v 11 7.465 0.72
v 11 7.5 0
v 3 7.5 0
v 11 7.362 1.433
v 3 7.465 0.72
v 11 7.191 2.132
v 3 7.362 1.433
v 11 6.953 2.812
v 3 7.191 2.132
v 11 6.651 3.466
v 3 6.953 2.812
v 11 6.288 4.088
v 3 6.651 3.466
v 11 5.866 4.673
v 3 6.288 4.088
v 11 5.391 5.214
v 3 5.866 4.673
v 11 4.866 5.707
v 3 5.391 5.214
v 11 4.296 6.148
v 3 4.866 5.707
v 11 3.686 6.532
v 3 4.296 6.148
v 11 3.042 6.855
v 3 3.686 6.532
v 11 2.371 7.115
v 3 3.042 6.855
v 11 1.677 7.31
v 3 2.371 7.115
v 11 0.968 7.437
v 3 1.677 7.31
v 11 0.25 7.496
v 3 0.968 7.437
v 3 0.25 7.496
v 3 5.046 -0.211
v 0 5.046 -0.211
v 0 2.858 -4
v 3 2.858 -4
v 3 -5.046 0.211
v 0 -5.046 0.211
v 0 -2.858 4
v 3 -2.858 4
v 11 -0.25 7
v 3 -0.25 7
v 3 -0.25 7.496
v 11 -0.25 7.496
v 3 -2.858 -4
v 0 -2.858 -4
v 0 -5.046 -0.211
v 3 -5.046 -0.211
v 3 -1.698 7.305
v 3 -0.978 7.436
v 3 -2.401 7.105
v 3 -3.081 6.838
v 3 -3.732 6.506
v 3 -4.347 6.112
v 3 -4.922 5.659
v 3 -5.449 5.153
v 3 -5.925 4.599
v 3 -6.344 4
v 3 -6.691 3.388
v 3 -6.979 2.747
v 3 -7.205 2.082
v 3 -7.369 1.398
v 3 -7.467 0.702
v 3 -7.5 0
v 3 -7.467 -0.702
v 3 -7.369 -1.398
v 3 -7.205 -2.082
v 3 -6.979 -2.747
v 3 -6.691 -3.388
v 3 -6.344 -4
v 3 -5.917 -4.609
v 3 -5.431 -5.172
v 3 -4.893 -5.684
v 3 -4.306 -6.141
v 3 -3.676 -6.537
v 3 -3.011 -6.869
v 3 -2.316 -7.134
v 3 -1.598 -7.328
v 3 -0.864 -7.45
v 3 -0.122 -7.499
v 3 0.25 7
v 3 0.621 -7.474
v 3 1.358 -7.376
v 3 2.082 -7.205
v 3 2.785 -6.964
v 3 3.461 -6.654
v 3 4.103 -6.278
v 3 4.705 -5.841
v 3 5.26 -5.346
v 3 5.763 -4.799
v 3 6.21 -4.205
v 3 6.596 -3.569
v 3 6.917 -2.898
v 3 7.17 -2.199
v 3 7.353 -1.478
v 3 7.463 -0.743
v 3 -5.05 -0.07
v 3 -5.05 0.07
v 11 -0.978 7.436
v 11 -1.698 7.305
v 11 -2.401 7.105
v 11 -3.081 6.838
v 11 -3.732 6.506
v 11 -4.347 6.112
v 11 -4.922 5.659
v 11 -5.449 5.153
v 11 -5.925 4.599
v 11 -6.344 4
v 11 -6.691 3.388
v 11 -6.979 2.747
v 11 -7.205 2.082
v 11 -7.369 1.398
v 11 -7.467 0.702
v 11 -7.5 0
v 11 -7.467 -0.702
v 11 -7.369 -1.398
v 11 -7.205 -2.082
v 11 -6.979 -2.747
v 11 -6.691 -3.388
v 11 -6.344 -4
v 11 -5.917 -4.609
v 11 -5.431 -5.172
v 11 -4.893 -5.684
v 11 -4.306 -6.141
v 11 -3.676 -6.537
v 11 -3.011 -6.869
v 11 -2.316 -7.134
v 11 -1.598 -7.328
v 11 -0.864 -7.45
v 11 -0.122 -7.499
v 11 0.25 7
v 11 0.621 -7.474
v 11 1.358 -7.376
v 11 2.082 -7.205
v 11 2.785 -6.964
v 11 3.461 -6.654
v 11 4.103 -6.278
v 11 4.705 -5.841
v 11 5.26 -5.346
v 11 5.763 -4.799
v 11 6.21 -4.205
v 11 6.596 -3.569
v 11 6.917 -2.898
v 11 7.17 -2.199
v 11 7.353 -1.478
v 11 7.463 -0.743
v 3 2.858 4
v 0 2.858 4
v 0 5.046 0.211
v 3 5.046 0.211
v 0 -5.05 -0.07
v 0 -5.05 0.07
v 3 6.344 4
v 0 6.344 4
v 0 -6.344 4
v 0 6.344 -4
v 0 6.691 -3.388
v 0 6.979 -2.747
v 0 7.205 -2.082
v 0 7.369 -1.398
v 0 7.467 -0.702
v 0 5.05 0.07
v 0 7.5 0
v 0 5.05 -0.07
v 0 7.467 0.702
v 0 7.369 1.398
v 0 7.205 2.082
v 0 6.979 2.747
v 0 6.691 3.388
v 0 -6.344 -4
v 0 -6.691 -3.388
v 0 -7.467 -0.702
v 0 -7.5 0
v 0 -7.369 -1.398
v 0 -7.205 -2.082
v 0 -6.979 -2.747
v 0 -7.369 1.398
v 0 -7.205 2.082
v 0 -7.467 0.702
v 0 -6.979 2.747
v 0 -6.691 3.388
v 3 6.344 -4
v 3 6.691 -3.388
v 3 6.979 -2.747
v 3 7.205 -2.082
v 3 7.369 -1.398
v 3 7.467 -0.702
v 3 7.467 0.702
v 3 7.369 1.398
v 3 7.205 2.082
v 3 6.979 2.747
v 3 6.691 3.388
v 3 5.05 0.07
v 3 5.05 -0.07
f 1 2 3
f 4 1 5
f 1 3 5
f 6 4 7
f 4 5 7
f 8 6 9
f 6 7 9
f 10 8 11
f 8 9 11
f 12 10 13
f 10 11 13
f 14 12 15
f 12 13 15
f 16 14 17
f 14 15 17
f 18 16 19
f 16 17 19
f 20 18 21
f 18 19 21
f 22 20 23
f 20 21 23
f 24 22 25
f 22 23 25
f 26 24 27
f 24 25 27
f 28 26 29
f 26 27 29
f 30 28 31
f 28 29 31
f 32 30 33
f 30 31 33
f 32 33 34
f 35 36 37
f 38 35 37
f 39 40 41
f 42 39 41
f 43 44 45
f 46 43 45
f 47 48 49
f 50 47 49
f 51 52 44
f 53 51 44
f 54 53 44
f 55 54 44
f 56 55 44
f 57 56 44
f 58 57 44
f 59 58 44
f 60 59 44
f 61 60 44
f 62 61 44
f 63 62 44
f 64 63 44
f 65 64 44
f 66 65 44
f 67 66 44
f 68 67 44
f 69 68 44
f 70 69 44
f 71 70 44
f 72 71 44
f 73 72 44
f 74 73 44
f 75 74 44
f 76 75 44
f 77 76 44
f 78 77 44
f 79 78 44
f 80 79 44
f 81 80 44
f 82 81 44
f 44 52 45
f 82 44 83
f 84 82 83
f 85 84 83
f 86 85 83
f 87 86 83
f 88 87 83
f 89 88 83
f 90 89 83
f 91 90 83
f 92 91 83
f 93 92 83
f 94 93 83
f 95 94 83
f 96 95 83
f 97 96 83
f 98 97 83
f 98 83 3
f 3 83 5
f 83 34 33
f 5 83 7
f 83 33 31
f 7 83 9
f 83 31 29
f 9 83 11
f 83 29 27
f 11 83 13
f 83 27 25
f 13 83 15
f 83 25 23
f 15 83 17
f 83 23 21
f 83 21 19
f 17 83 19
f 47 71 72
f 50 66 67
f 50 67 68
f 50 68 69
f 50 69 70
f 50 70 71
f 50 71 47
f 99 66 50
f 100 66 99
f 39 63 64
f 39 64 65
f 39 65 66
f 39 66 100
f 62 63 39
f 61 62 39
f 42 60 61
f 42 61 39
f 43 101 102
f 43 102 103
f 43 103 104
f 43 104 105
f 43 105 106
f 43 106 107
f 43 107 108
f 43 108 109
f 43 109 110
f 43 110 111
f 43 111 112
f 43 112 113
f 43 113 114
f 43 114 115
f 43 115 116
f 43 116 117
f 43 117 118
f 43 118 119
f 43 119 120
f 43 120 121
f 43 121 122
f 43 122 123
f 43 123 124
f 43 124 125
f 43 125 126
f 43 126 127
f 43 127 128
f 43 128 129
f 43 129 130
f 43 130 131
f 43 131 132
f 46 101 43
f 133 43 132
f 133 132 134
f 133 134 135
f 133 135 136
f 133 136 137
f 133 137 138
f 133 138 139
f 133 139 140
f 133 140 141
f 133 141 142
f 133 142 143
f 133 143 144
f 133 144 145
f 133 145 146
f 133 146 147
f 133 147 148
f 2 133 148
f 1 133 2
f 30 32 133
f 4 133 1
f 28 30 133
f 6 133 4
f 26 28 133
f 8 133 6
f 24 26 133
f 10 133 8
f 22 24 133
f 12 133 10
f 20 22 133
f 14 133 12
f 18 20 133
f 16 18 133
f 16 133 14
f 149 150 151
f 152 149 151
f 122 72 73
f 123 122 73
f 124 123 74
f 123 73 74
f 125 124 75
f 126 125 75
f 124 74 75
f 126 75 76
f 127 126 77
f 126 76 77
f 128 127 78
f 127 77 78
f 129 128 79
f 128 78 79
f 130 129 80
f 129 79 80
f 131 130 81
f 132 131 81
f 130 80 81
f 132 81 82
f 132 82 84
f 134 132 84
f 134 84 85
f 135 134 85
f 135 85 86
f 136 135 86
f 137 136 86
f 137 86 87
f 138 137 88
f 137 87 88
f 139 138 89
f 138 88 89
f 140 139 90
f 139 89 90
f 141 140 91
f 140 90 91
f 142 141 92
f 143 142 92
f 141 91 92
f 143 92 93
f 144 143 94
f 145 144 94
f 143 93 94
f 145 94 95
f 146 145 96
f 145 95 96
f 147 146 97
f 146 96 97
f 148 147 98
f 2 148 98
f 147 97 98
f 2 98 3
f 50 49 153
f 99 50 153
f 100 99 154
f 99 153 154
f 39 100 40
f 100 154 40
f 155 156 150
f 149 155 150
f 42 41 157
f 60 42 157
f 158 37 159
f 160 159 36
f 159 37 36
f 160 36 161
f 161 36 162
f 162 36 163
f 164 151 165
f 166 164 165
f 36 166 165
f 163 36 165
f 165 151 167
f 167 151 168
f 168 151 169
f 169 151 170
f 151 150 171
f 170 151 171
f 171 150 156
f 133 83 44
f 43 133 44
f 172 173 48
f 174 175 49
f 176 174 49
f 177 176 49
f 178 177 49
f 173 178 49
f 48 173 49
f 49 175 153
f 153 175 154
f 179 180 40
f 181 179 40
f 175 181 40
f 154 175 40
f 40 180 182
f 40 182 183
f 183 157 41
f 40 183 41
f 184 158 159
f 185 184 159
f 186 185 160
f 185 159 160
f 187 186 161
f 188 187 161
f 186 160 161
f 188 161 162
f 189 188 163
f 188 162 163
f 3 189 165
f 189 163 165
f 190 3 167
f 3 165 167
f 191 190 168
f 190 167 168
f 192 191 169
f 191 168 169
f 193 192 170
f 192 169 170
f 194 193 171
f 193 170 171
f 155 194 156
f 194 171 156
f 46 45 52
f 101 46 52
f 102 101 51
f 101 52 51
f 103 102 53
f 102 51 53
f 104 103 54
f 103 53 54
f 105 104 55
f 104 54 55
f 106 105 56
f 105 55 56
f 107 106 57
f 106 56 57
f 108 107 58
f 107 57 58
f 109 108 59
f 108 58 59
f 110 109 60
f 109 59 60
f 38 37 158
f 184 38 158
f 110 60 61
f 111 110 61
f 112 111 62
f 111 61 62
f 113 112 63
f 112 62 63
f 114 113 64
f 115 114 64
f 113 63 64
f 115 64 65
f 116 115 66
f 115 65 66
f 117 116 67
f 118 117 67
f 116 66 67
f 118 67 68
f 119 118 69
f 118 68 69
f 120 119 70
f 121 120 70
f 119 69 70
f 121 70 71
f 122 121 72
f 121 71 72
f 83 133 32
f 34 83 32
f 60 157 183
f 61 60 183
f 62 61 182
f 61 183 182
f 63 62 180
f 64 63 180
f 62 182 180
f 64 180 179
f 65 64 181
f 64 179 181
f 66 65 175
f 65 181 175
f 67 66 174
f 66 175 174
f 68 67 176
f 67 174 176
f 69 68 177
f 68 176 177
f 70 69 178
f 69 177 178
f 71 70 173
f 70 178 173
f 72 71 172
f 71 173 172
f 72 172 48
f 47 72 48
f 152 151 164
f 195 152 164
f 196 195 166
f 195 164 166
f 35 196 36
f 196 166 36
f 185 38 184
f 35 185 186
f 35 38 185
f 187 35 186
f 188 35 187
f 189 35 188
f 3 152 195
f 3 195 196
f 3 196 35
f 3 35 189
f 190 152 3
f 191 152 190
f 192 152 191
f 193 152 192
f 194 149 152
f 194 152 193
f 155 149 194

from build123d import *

# Parameters (mm, degrees)
F1_DEPTH = 3
F3_DEPTH = 8
F4_W     = 0.5
F4_H     = 0.5
F5_DEPTH = 25


with BuildPart() as f1:
    # F0 (on Right) → F1 (new body)
    with BuildSketch(Plane.YZ):
        with BuildLine():
            ThreePointArc((-5.0456, -0.210765), (-5.05, 0), (-5.0456, 0.210765))
            Line((-5.0456, 0.210765), (-2.857884, 4))
            Line((-2.857884, 4), (-6.344289, 4))
            ThreePointArc((-6.344289, 4), (-7.5, 0), (-6.344289, -4))
            Line((-6.344289, -4), (-2.857884, -4))
            Line((-2.857884, -4), (-5.0456, -0.210765))
        make_face()
        with BuildLine():
            Line((6.344289, 4), (2.857884, 4))
            Line((2.857884, 4), (5.0456, 0.210765))
            ThreePointArc((5.0456, 0.210765), (5.05, 0), (5.0456, -0.210765))
            Line((5.0456, -0.210765), (2.857884, -4))
            Line((2.857884, -4), (6.344289, -4))
            ThreePointArc((6.344289, -4), (7.5, 0), (6.344289, 4))
        make_face()
    extrude(amount=F1_DEPTH)


with BuildPart() as f3:
    # F2 (on face) → F3 (new body)
    with BuildSketch(Plane.YZ.offset(3)):
        with BuildLine():
            Line((-2.857884, 4), (-6.344289, 4))
            ThreePointArc((-6.344289, 4), (-7.5, 0), (-6.344289, -4))
            Line((-6.344289, -4), (-2.857884, -4))
            Line((-2.857884, -4), (-5.0456, -0.210765))
            ThreePointArc((-5.0456, -0.210765), (-5.05, 0), (-5.0456, 0.210765))
            Line((-5.0456, 0.210765), (-2.857884, 4))
        make_face()
        with BuildLine():
            ThreePointArc((-6.344289, -4), (2.081806, -7.205282), (7.5, 0))
            ThreePointArc((7.5, 0), (2.081806, 7.205282), (-6.344289, 4))
            Line((-6.344289, 4), (-2.857884, 4))
            Line((-2.857884, 4), (-5.0456, 0.210765))
            ThreePointArc((-5.0456, 0.210765), (-5.05, 0), (-5.0456, -0.210765))
            Line((-5.0456, -0.210765), (-2.857884, -4))
            Line((-2.857884, -4), (-6.344289, -4))
        make_face()
    extrude(amount=F3_DEPTH)

    # F4 (on face) → F5 (cut)
    with BuildSketch(Plane(origin=(3, 0, 0), x_dir=(0, -1, 0), z_dir=(-1, 0, 0))):
        with Locations((0, 7.25)):
            Rectangle(F4_W, F4_H)
    extrude(amount=-F5_DEPTH, mode=Mode.SUBTRACT)


solid = Compound([f1.part, f3.part])
